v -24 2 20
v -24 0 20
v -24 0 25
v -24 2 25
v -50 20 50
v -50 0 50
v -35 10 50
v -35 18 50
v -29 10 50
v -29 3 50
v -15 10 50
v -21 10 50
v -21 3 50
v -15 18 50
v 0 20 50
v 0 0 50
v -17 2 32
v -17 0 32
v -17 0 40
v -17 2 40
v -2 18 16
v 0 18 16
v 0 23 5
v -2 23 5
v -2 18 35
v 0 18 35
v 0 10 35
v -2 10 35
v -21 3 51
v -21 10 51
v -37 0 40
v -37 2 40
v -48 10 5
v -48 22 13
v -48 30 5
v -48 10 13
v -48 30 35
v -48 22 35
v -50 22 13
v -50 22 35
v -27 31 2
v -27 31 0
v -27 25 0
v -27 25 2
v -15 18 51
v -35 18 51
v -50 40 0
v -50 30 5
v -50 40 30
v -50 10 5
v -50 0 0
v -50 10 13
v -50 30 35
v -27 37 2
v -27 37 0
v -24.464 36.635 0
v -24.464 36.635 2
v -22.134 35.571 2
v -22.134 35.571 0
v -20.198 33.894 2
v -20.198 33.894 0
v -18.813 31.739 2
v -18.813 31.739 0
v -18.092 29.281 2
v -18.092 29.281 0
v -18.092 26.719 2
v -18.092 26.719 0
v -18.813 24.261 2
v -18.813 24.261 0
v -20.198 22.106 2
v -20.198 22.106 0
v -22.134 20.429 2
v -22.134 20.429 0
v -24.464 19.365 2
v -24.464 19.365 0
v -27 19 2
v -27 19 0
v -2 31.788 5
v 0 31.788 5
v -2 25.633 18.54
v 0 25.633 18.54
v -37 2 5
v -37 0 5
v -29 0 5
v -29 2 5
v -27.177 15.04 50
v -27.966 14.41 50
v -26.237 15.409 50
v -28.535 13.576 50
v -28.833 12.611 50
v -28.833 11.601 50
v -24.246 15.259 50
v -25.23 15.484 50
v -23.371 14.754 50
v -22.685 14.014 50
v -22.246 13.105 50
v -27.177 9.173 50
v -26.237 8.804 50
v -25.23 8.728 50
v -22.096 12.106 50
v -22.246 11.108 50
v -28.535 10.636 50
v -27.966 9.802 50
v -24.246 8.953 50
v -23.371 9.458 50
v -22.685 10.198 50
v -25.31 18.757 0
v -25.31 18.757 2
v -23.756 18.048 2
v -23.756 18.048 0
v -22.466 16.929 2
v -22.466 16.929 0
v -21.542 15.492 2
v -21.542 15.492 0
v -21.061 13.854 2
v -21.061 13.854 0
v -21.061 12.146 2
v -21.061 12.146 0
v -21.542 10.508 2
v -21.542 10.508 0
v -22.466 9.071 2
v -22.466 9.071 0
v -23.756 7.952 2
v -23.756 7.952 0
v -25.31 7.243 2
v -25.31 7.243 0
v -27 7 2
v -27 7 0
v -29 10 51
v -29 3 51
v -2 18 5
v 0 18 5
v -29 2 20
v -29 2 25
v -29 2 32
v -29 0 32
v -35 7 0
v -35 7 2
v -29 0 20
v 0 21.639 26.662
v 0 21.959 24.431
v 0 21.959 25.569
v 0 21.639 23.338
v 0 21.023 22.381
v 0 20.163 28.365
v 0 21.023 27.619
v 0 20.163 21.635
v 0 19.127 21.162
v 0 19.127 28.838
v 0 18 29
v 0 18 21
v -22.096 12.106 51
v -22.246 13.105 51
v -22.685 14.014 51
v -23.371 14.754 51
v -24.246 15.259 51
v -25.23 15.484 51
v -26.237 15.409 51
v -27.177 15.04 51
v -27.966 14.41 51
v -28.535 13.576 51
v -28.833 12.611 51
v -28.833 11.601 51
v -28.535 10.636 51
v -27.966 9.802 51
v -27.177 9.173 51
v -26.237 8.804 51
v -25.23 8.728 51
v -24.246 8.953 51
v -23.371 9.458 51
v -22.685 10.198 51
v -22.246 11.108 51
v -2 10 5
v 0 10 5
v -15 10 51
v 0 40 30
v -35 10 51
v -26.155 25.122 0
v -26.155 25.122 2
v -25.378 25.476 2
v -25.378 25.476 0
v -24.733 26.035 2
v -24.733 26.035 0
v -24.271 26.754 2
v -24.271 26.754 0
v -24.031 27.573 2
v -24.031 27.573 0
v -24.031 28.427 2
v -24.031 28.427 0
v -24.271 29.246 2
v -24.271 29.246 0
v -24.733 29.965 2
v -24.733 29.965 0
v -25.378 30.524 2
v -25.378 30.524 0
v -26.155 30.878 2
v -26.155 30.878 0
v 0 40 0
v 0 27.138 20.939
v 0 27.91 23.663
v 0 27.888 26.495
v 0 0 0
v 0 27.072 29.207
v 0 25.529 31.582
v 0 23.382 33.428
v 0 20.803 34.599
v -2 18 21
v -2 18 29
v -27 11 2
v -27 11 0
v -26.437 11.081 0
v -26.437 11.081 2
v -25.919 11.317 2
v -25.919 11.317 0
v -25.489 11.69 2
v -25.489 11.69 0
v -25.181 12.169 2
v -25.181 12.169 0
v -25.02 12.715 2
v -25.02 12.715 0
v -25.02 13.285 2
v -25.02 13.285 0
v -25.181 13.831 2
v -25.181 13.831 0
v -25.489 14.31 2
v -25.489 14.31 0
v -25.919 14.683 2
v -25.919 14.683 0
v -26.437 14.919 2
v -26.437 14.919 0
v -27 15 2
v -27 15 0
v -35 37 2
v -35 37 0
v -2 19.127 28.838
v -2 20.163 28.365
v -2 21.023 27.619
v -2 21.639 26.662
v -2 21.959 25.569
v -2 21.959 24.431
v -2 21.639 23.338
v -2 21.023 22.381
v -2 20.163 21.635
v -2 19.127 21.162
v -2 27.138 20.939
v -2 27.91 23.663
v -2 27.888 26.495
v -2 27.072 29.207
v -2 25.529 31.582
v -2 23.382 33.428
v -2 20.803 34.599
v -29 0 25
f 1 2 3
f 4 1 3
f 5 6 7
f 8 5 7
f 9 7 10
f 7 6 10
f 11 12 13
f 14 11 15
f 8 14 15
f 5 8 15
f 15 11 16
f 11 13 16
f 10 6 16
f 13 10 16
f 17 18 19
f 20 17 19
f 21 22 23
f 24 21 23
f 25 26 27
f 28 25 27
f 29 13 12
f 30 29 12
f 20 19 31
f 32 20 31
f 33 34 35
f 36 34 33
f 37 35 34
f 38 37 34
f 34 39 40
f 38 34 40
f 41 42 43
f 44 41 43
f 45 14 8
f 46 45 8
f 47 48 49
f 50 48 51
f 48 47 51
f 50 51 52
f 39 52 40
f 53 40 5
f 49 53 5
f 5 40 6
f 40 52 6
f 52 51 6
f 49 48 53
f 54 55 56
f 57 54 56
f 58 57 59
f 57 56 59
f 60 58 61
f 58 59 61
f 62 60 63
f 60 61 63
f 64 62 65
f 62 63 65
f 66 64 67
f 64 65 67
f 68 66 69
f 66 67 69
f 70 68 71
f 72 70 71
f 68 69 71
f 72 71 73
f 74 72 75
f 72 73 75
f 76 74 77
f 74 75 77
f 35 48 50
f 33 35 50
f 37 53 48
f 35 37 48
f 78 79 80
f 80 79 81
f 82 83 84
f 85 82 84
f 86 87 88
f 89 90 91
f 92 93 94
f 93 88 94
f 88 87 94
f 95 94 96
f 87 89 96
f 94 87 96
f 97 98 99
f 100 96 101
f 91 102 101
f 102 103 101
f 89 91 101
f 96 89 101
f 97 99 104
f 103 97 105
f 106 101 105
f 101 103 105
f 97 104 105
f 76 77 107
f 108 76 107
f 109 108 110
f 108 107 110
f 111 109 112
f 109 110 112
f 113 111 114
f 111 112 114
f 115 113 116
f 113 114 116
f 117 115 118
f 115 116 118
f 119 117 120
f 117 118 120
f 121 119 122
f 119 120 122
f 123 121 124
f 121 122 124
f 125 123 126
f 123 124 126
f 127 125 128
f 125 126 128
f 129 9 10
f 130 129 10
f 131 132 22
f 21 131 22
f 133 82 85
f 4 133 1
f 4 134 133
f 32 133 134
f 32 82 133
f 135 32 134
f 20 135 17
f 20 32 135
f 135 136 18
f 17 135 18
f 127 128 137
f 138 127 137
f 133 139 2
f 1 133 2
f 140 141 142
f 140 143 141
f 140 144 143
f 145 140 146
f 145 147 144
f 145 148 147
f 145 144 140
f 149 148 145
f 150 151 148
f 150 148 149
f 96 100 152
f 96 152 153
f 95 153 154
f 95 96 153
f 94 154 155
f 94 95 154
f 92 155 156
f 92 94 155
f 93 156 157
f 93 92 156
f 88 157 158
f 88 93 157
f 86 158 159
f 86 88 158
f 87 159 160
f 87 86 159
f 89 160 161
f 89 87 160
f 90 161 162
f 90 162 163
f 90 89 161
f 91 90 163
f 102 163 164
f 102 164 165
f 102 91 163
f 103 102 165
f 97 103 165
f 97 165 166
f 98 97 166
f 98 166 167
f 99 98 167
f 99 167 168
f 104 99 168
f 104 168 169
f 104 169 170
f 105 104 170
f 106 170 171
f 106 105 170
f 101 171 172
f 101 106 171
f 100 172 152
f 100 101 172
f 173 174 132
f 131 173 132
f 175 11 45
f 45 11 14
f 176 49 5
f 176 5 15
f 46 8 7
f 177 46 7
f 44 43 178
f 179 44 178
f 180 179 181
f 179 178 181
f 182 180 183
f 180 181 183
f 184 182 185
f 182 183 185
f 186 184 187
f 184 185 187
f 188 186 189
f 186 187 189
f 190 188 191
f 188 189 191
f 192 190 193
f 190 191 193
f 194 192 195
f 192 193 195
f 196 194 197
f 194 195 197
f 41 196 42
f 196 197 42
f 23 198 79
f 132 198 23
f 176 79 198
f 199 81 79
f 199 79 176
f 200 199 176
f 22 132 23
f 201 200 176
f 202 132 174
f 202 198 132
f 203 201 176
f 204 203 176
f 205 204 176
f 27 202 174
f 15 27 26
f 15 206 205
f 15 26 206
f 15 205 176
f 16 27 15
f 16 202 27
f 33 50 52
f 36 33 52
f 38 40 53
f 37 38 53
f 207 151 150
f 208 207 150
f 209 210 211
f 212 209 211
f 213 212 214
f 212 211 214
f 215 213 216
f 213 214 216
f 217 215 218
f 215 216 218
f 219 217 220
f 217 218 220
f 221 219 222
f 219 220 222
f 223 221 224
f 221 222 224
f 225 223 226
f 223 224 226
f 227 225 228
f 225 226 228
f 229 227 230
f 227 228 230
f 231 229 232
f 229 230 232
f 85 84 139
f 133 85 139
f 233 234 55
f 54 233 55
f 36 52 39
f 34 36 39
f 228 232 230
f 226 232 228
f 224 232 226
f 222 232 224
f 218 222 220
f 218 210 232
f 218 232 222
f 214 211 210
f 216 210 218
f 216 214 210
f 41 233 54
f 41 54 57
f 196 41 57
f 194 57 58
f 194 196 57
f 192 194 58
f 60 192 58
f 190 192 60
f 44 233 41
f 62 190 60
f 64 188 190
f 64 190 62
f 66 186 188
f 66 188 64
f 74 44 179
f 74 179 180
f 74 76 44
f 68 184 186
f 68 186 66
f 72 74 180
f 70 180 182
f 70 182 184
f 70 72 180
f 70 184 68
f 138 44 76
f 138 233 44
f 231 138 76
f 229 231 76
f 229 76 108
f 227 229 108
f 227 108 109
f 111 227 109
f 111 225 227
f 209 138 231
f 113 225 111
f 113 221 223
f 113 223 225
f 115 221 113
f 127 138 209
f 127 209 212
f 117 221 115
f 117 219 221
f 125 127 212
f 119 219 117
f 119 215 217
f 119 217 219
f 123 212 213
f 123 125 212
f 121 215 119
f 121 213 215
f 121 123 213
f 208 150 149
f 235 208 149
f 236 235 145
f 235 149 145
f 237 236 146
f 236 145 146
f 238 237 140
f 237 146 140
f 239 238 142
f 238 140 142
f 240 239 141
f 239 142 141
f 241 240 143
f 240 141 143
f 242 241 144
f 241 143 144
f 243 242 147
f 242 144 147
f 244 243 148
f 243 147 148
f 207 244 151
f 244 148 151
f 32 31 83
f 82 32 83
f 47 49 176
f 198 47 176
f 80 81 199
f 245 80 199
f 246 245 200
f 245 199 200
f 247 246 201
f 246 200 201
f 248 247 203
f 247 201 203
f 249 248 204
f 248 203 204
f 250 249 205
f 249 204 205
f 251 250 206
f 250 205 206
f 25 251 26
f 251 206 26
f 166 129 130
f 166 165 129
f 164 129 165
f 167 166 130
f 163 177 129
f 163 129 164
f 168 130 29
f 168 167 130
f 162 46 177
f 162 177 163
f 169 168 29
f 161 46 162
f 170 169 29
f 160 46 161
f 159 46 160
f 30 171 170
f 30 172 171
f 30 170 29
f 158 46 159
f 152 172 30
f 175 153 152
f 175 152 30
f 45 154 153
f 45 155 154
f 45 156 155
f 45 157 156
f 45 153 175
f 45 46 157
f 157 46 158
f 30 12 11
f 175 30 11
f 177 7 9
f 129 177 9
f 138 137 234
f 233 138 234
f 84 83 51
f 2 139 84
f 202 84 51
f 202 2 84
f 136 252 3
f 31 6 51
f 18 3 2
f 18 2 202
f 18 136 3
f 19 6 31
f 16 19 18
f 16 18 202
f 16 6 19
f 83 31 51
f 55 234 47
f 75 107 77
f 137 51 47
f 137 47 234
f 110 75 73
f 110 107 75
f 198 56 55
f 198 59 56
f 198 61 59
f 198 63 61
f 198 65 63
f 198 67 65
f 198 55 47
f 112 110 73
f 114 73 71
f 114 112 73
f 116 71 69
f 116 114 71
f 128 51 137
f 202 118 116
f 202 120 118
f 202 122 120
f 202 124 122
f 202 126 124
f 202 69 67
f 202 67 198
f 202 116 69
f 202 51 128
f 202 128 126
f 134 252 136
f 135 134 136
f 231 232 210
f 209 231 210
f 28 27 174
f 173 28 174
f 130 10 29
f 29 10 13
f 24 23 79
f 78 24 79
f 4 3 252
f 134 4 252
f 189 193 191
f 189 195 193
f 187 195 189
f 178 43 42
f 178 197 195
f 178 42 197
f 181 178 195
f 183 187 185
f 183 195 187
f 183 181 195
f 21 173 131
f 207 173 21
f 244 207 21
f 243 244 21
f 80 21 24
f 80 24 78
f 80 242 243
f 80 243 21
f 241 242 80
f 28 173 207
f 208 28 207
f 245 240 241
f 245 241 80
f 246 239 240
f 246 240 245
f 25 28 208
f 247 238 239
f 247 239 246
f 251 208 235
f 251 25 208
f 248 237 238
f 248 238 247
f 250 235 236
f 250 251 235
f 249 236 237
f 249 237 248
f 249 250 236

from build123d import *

# Parameters (mm, degrees)
F0_W      = 50
F0_H      = 50
F1_DEPTH  = 40
F2_SIZE   = 20
F4_DEPTH  = 2
F6_DEPTH  = 2
F8_DEPTH  = 2
F9_R      = 3.387278
F10_DEPTH = 1
F12_DEPTH = 2


with BuildPart() as f1:
    # F0 (on Front) → F1 (new body)
    with BuildSketch(Plane.XZ):
        with Locations((-25, 25)):
            Rectangle(F0_W, F0_H)
    extrude(amount=-F1_DEPTH)

    # F2
    f2_edges = [f1.edges().sort_by_distance(p)[0] for p in [
        (-25, 40, 50),
    ]]
    chamfer(f2_edges, length=F2_SIZE)

    # F3 (on face) → F4 (cut)
    with BuildSketch(Plane.XZ):
        Polygon((-37, 40), (-37, 5), (-29, 5), (-29, 20), (-24, 20), (-24, 25), (-29, 25), (-29, 32), (-17, 32), (-17, 40), align=None)
    extrude(amount=-F4_DEPTH, mode=Mode.SUBTRACT)

    # F5 (on face) → F6 (cut)
    with BuildSketch(Plane.YZ):
        with BuildLine():
            Line((10, 35), (10, 5))
            Line((10, 5), (18, 5))
            Line((18, 5), (18, 16))
            Line((18, 16), (23, 5))
            Line((23, 5), (31.78767, 5))
            Line((31.78767, 5), (25.633212, 18.539808))
            ThreePointArc((25.633212, 18.539808), (27.071988, 29.207023), (18, 35))
            Line((18, 35), (10, 35))
        make_face()
        with BuildLine():
            Line((18, 21), (18, 29))
            ThreePointArc((18, 29), (22, 25), (18, 21))
        make_face(mode=Mode.SUBTRACT)
    extrude(amount=-F6_DEPTH, mode=Mode.SUBTRACT)

    # F7 (on face) → F8 (cut)
    with BuildSketch(Plane(origin=(-50, 0, 0), x_dir=(0, -1, 0), z_dir=(-1, 0, 0))):
        Polygon((-22, 35), (-30, 35), (-30, 5), (-10, 5), (-10, 13), (-22, 13), align=None)
    extrude(amount=-F8_DEPTH, mode=Mode.SUBTRACT)

    # F9 (on face) → F10 (join)
    with BuildSketch(Plane.XY.offset(50)):
        Polygon((-29, 10), (-29, 3), (-21, 3), (-21, 10), (-15, 10), (-15, 18), (-35, 18), (-35, 10), align=None)
        with Locations((-25.483249, 12.10618)):
            Circle(F9_R, mode=Mode.SUBTRACT)
    extrude(amount=F10_DEPTH)

    # F11 (on face) → F12 (cut)
    with BuildSketch(Plane(origin=(0, 0, 0), x_dir=(1, 0, 0), z_dir=(0, 0, -1))):
        with BuildLine():
            Line((-35, -7), (-35, -37))
            Line((-35, -37), (-27, -37))
            ThreePointArc((-27, -37), (-18, -28), (-27, -19))
            ThreePointArc((-27, -19), (-21, -13), (-27, -7))
            Line((-27, -7), (-35, -7))
        make_face()
        with BuildLine():
            ThreePointArc((-27, -25), (-24, -28), (-27, -31))
            Line((-27, -31), (-27, -25))
        make_face(mode=Mode.SUBTRACT)
        with BuildLine():
            Line((-27, -15), (-27, -11))
            ThreePointArc((-27, -11), (-25, -13), (-27, -15))
        make_face(mode=Mode.SUBTRACT)
    extrude(amount=-F12_DEPTH, mode=Mode.SUBTRACT)


solid = f1.part
